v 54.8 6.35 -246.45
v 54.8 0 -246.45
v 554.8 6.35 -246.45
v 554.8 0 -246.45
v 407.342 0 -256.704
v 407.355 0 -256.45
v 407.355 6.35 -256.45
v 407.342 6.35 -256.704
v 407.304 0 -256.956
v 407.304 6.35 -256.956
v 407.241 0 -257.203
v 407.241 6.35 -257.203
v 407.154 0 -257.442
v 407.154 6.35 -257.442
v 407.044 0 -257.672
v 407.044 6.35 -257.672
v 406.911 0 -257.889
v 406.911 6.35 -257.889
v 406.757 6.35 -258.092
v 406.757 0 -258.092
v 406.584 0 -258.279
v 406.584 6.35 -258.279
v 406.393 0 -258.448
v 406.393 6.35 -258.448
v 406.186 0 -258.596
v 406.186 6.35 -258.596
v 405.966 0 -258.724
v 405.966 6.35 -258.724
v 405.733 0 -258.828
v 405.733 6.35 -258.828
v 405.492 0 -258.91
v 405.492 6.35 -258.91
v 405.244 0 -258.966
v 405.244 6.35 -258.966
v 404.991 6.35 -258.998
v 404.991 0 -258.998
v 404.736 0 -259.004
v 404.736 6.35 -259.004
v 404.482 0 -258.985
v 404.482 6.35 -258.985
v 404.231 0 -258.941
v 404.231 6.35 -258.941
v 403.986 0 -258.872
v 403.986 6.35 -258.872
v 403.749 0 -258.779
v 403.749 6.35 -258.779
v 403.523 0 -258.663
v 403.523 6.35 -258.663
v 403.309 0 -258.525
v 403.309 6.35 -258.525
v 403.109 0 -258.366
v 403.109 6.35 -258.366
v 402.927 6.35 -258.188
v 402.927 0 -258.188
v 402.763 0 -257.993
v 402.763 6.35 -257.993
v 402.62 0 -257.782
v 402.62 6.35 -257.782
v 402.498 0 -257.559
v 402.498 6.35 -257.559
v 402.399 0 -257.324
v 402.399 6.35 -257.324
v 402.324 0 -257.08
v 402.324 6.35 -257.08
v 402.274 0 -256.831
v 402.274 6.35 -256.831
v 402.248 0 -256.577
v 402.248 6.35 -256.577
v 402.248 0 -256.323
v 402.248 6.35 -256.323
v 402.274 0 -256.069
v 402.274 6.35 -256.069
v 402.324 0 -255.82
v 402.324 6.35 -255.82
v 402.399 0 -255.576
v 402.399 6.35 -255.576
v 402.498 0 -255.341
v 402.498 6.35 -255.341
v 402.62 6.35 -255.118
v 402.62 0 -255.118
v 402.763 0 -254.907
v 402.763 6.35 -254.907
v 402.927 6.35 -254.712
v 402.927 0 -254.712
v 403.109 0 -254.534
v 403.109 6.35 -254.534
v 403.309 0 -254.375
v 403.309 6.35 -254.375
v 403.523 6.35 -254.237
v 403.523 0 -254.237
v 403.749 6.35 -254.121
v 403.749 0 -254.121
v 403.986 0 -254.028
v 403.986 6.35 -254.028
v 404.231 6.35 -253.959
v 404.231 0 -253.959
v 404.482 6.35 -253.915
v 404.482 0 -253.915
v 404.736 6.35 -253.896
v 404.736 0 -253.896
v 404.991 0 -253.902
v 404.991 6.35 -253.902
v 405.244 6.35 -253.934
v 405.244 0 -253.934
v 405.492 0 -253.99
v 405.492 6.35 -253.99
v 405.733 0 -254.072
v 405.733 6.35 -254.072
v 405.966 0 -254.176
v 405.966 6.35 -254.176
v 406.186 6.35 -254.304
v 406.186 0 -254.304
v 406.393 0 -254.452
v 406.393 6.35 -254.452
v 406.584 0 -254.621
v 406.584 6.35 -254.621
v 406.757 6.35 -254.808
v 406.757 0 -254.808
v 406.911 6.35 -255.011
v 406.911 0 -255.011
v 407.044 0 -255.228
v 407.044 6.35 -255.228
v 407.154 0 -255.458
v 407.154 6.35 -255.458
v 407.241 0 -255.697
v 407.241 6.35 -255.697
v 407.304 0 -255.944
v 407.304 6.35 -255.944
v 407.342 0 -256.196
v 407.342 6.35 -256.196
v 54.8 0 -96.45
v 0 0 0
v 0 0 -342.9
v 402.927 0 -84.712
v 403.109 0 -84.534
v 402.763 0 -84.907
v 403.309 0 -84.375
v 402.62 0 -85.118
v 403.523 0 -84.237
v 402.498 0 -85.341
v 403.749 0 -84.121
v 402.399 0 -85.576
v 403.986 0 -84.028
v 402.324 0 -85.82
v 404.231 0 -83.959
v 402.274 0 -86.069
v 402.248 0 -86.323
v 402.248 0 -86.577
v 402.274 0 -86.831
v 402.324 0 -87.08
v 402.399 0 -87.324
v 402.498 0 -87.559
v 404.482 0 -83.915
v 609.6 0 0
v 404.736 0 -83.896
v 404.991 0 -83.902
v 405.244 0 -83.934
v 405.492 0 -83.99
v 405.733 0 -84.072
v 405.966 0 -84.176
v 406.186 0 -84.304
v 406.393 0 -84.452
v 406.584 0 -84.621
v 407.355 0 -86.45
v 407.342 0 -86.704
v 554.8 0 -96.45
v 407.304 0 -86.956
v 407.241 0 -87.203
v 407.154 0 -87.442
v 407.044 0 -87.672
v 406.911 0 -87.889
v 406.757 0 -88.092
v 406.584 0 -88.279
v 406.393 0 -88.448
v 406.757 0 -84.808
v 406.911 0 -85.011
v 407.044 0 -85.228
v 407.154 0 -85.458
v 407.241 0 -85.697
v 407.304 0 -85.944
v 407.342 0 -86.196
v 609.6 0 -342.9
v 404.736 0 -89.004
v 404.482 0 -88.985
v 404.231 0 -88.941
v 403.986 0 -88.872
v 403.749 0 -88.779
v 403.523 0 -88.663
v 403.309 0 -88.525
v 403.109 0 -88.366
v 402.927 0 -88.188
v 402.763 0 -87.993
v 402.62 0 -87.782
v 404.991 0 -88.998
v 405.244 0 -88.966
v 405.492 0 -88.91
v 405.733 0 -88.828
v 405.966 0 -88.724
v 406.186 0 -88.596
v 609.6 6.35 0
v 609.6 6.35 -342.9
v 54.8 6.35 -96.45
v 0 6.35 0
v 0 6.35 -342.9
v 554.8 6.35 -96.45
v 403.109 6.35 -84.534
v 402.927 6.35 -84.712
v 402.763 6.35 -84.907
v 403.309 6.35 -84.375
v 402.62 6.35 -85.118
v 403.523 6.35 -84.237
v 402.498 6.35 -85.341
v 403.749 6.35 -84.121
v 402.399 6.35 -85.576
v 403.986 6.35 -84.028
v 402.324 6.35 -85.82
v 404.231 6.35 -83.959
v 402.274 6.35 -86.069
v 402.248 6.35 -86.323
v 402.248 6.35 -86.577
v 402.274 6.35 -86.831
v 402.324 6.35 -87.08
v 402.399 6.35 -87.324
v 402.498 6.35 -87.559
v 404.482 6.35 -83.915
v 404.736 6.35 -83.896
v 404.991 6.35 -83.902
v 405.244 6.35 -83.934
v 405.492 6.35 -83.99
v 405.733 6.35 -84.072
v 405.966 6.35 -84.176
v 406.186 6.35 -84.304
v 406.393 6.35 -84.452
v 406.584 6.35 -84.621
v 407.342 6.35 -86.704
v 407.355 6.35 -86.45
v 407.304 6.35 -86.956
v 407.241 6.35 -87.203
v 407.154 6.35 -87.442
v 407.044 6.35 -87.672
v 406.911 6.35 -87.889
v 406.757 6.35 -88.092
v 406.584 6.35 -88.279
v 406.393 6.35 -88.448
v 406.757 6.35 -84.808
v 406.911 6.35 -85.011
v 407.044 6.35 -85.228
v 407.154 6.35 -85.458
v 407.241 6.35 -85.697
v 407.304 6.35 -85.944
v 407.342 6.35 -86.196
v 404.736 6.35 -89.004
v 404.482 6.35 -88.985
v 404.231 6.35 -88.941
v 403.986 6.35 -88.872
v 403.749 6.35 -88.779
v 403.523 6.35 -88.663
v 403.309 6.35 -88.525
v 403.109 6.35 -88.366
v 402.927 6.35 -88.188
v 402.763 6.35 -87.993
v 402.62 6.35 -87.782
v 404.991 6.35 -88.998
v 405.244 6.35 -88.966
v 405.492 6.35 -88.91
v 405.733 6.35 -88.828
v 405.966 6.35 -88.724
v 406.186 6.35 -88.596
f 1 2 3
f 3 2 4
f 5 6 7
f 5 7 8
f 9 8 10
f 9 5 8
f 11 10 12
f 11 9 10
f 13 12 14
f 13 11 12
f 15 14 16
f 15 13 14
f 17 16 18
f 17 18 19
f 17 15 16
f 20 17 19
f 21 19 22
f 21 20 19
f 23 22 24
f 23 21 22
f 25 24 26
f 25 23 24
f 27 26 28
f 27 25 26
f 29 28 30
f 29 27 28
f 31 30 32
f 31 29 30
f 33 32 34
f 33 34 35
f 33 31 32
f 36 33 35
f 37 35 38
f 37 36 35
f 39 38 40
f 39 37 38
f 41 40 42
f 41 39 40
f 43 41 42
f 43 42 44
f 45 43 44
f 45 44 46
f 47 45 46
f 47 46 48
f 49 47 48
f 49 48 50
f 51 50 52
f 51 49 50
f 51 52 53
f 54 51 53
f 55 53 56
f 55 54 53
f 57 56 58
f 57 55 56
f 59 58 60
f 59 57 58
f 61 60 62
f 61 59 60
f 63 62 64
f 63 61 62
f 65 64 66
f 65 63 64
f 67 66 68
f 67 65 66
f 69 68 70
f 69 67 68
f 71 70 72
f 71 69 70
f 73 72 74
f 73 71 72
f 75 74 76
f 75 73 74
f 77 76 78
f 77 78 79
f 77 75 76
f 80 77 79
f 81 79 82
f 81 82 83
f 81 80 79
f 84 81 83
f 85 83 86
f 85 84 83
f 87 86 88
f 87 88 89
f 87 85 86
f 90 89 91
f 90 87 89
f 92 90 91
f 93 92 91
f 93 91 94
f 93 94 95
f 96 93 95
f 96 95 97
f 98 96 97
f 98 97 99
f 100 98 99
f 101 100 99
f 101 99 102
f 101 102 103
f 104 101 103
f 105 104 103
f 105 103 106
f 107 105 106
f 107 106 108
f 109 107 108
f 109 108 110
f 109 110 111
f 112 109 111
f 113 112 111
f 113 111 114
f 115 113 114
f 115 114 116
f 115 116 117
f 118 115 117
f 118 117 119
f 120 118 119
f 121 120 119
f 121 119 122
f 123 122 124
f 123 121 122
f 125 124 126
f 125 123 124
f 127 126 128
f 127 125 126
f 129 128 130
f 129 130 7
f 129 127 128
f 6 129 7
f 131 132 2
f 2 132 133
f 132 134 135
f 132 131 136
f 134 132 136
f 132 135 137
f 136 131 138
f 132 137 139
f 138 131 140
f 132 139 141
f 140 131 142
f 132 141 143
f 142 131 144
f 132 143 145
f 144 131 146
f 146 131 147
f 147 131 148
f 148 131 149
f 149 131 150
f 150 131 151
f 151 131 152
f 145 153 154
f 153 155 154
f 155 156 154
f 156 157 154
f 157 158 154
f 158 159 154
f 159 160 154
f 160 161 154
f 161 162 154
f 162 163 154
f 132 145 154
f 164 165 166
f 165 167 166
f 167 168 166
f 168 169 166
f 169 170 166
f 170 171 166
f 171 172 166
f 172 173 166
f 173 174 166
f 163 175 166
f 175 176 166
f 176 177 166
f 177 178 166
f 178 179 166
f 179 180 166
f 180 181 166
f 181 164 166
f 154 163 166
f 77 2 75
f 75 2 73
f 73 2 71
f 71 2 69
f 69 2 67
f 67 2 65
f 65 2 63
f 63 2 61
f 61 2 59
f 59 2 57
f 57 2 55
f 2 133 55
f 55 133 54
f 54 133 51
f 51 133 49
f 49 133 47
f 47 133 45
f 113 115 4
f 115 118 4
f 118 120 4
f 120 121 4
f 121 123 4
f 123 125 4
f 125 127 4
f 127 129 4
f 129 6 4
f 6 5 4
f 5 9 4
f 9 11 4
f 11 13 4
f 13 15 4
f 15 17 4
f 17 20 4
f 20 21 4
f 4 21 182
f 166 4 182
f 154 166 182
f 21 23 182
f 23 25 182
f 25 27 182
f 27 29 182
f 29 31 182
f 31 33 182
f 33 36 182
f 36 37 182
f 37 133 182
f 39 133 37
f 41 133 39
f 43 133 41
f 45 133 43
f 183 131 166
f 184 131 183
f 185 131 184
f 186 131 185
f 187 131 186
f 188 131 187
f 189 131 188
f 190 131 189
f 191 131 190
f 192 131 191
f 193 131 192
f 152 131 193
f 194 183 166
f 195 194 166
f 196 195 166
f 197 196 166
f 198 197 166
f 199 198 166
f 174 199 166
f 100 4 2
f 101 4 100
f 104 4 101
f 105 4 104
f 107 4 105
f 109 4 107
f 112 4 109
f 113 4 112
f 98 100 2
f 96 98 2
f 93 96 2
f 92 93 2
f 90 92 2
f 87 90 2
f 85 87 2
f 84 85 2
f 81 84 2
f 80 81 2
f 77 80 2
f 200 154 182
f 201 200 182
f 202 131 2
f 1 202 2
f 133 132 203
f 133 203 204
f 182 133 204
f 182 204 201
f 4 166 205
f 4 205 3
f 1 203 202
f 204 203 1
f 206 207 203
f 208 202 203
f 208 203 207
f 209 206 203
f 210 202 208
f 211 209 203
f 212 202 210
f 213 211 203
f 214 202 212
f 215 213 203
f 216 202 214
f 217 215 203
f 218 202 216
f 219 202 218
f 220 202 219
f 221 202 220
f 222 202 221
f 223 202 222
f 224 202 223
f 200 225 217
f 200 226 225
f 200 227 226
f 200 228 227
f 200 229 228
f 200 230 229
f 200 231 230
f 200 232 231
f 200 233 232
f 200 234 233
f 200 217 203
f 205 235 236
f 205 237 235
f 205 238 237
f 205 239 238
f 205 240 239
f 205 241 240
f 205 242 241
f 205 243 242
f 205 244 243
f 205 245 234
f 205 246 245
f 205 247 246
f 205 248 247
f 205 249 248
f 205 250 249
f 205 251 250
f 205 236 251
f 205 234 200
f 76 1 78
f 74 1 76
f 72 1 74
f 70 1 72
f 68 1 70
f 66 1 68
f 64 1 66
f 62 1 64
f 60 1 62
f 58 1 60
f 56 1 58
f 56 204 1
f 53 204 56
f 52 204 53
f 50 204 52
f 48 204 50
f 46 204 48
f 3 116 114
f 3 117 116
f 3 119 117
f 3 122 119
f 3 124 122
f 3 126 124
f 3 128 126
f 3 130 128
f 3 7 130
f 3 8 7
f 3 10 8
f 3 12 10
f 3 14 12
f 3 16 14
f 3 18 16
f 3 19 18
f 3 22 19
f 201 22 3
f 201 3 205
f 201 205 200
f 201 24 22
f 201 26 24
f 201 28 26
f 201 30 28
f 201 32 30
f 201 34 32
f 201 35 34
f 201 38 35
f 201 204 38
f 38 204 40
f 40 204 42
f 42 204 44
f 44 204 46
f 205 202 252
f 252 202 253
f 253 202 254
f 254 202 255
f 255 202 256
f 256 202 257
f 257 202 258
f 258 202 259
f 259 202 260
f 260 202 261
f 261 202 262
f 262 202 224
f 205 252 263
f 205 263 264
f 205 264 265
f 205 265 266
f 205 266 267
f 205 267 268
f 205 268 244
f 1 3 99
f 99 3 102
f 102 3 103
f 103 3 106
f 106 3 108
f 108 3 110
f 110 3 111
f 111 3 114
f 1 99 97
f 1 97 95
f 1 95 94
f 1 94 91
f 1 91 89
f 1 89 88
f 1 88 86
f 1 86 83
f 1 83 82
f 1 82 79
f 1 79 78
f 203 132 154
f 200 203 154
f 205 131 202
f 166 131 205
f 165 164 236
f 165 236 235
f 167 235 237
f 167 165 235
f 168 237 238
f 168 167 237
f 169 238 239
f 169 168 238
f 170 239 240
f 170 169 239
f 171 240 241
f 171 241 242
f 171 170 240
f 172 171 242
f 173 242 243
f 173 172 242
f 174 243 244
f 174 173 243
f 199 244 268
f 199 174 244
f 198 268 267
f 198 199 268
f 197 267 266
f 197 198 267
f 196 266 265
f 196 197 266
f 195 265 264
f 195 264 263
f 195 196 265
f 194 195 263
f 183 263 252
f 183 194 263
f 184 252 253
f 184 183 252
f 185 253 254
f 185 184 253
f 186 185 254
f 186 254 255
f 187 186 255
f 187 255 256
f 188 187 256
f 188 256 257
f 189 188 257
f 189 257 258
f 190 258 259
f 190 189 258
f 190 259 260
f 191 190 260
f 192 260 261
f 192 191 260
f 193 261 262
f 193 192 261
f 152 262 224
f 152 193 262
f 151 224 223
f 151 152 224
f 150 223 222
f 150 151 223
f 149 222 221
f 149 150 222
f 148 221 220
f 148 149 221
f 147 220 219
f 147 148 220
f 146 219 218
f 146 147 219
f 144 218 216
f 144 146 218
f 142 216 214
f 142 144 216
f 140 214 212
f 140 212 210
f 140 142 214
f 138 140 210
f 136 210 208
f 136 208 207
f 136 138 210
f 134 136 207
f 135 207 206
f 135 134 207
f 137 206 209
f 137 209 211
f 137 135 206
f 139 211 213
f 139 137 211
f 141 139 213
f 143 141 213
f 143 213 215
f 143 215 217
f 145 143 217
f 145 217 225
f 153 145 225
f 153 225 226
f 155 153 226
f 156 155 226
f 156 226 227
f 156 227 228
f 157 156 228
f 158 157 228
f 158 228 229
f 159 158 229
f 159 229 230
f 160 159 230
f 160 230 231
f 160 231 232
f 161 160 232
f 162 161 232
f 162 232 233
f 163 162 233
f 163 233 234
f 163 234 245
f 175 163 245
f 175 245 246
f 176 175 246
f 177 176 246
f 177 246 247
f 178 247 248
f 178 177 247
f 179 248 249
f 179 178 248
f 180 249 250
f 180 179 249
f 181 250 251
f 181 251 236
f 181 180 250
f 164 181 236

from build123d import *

# Parameters (mm, degrees)
SKETCH1_W           = 609.6
SKETCH1_H           = 342.9
SKETCH1_R           = 2.555
SKETCH1_W_2         = 500
SKETCH1_H_2         = 150
BOSS_EXTRUDE1_DEPTH = 6.35


with BuildPart() as part:
    # Sketch1 → Boss-Extrude1 (new body)
    with BuildSketch(Plane(origin=(0, 0, 0), x_dir=(1, 0, 0), z_dir=(0, 1, 0))):
        with Locations((304.8, 171.45)):
            Rectangle(SKETCH1_W, SKETCH1_H)
        with Locations((404.8, 256.45)):
            Circle(SKETCH1_R, mode=Mode.SUBTRACT)
        with Locations((404.8, 86.45)):
            Circle(SKETCH1_R, mode=Mode.SUBTRACT)
        with Locations((304.8, 171.45)):
            Rectangle(SKETCH1_W_2, SKETCH1_H_2, mode=Mode.SUBTRACT)
    extrude(amount=BOSS_EXTRUDE1_DEPTH)


solid = part.part
